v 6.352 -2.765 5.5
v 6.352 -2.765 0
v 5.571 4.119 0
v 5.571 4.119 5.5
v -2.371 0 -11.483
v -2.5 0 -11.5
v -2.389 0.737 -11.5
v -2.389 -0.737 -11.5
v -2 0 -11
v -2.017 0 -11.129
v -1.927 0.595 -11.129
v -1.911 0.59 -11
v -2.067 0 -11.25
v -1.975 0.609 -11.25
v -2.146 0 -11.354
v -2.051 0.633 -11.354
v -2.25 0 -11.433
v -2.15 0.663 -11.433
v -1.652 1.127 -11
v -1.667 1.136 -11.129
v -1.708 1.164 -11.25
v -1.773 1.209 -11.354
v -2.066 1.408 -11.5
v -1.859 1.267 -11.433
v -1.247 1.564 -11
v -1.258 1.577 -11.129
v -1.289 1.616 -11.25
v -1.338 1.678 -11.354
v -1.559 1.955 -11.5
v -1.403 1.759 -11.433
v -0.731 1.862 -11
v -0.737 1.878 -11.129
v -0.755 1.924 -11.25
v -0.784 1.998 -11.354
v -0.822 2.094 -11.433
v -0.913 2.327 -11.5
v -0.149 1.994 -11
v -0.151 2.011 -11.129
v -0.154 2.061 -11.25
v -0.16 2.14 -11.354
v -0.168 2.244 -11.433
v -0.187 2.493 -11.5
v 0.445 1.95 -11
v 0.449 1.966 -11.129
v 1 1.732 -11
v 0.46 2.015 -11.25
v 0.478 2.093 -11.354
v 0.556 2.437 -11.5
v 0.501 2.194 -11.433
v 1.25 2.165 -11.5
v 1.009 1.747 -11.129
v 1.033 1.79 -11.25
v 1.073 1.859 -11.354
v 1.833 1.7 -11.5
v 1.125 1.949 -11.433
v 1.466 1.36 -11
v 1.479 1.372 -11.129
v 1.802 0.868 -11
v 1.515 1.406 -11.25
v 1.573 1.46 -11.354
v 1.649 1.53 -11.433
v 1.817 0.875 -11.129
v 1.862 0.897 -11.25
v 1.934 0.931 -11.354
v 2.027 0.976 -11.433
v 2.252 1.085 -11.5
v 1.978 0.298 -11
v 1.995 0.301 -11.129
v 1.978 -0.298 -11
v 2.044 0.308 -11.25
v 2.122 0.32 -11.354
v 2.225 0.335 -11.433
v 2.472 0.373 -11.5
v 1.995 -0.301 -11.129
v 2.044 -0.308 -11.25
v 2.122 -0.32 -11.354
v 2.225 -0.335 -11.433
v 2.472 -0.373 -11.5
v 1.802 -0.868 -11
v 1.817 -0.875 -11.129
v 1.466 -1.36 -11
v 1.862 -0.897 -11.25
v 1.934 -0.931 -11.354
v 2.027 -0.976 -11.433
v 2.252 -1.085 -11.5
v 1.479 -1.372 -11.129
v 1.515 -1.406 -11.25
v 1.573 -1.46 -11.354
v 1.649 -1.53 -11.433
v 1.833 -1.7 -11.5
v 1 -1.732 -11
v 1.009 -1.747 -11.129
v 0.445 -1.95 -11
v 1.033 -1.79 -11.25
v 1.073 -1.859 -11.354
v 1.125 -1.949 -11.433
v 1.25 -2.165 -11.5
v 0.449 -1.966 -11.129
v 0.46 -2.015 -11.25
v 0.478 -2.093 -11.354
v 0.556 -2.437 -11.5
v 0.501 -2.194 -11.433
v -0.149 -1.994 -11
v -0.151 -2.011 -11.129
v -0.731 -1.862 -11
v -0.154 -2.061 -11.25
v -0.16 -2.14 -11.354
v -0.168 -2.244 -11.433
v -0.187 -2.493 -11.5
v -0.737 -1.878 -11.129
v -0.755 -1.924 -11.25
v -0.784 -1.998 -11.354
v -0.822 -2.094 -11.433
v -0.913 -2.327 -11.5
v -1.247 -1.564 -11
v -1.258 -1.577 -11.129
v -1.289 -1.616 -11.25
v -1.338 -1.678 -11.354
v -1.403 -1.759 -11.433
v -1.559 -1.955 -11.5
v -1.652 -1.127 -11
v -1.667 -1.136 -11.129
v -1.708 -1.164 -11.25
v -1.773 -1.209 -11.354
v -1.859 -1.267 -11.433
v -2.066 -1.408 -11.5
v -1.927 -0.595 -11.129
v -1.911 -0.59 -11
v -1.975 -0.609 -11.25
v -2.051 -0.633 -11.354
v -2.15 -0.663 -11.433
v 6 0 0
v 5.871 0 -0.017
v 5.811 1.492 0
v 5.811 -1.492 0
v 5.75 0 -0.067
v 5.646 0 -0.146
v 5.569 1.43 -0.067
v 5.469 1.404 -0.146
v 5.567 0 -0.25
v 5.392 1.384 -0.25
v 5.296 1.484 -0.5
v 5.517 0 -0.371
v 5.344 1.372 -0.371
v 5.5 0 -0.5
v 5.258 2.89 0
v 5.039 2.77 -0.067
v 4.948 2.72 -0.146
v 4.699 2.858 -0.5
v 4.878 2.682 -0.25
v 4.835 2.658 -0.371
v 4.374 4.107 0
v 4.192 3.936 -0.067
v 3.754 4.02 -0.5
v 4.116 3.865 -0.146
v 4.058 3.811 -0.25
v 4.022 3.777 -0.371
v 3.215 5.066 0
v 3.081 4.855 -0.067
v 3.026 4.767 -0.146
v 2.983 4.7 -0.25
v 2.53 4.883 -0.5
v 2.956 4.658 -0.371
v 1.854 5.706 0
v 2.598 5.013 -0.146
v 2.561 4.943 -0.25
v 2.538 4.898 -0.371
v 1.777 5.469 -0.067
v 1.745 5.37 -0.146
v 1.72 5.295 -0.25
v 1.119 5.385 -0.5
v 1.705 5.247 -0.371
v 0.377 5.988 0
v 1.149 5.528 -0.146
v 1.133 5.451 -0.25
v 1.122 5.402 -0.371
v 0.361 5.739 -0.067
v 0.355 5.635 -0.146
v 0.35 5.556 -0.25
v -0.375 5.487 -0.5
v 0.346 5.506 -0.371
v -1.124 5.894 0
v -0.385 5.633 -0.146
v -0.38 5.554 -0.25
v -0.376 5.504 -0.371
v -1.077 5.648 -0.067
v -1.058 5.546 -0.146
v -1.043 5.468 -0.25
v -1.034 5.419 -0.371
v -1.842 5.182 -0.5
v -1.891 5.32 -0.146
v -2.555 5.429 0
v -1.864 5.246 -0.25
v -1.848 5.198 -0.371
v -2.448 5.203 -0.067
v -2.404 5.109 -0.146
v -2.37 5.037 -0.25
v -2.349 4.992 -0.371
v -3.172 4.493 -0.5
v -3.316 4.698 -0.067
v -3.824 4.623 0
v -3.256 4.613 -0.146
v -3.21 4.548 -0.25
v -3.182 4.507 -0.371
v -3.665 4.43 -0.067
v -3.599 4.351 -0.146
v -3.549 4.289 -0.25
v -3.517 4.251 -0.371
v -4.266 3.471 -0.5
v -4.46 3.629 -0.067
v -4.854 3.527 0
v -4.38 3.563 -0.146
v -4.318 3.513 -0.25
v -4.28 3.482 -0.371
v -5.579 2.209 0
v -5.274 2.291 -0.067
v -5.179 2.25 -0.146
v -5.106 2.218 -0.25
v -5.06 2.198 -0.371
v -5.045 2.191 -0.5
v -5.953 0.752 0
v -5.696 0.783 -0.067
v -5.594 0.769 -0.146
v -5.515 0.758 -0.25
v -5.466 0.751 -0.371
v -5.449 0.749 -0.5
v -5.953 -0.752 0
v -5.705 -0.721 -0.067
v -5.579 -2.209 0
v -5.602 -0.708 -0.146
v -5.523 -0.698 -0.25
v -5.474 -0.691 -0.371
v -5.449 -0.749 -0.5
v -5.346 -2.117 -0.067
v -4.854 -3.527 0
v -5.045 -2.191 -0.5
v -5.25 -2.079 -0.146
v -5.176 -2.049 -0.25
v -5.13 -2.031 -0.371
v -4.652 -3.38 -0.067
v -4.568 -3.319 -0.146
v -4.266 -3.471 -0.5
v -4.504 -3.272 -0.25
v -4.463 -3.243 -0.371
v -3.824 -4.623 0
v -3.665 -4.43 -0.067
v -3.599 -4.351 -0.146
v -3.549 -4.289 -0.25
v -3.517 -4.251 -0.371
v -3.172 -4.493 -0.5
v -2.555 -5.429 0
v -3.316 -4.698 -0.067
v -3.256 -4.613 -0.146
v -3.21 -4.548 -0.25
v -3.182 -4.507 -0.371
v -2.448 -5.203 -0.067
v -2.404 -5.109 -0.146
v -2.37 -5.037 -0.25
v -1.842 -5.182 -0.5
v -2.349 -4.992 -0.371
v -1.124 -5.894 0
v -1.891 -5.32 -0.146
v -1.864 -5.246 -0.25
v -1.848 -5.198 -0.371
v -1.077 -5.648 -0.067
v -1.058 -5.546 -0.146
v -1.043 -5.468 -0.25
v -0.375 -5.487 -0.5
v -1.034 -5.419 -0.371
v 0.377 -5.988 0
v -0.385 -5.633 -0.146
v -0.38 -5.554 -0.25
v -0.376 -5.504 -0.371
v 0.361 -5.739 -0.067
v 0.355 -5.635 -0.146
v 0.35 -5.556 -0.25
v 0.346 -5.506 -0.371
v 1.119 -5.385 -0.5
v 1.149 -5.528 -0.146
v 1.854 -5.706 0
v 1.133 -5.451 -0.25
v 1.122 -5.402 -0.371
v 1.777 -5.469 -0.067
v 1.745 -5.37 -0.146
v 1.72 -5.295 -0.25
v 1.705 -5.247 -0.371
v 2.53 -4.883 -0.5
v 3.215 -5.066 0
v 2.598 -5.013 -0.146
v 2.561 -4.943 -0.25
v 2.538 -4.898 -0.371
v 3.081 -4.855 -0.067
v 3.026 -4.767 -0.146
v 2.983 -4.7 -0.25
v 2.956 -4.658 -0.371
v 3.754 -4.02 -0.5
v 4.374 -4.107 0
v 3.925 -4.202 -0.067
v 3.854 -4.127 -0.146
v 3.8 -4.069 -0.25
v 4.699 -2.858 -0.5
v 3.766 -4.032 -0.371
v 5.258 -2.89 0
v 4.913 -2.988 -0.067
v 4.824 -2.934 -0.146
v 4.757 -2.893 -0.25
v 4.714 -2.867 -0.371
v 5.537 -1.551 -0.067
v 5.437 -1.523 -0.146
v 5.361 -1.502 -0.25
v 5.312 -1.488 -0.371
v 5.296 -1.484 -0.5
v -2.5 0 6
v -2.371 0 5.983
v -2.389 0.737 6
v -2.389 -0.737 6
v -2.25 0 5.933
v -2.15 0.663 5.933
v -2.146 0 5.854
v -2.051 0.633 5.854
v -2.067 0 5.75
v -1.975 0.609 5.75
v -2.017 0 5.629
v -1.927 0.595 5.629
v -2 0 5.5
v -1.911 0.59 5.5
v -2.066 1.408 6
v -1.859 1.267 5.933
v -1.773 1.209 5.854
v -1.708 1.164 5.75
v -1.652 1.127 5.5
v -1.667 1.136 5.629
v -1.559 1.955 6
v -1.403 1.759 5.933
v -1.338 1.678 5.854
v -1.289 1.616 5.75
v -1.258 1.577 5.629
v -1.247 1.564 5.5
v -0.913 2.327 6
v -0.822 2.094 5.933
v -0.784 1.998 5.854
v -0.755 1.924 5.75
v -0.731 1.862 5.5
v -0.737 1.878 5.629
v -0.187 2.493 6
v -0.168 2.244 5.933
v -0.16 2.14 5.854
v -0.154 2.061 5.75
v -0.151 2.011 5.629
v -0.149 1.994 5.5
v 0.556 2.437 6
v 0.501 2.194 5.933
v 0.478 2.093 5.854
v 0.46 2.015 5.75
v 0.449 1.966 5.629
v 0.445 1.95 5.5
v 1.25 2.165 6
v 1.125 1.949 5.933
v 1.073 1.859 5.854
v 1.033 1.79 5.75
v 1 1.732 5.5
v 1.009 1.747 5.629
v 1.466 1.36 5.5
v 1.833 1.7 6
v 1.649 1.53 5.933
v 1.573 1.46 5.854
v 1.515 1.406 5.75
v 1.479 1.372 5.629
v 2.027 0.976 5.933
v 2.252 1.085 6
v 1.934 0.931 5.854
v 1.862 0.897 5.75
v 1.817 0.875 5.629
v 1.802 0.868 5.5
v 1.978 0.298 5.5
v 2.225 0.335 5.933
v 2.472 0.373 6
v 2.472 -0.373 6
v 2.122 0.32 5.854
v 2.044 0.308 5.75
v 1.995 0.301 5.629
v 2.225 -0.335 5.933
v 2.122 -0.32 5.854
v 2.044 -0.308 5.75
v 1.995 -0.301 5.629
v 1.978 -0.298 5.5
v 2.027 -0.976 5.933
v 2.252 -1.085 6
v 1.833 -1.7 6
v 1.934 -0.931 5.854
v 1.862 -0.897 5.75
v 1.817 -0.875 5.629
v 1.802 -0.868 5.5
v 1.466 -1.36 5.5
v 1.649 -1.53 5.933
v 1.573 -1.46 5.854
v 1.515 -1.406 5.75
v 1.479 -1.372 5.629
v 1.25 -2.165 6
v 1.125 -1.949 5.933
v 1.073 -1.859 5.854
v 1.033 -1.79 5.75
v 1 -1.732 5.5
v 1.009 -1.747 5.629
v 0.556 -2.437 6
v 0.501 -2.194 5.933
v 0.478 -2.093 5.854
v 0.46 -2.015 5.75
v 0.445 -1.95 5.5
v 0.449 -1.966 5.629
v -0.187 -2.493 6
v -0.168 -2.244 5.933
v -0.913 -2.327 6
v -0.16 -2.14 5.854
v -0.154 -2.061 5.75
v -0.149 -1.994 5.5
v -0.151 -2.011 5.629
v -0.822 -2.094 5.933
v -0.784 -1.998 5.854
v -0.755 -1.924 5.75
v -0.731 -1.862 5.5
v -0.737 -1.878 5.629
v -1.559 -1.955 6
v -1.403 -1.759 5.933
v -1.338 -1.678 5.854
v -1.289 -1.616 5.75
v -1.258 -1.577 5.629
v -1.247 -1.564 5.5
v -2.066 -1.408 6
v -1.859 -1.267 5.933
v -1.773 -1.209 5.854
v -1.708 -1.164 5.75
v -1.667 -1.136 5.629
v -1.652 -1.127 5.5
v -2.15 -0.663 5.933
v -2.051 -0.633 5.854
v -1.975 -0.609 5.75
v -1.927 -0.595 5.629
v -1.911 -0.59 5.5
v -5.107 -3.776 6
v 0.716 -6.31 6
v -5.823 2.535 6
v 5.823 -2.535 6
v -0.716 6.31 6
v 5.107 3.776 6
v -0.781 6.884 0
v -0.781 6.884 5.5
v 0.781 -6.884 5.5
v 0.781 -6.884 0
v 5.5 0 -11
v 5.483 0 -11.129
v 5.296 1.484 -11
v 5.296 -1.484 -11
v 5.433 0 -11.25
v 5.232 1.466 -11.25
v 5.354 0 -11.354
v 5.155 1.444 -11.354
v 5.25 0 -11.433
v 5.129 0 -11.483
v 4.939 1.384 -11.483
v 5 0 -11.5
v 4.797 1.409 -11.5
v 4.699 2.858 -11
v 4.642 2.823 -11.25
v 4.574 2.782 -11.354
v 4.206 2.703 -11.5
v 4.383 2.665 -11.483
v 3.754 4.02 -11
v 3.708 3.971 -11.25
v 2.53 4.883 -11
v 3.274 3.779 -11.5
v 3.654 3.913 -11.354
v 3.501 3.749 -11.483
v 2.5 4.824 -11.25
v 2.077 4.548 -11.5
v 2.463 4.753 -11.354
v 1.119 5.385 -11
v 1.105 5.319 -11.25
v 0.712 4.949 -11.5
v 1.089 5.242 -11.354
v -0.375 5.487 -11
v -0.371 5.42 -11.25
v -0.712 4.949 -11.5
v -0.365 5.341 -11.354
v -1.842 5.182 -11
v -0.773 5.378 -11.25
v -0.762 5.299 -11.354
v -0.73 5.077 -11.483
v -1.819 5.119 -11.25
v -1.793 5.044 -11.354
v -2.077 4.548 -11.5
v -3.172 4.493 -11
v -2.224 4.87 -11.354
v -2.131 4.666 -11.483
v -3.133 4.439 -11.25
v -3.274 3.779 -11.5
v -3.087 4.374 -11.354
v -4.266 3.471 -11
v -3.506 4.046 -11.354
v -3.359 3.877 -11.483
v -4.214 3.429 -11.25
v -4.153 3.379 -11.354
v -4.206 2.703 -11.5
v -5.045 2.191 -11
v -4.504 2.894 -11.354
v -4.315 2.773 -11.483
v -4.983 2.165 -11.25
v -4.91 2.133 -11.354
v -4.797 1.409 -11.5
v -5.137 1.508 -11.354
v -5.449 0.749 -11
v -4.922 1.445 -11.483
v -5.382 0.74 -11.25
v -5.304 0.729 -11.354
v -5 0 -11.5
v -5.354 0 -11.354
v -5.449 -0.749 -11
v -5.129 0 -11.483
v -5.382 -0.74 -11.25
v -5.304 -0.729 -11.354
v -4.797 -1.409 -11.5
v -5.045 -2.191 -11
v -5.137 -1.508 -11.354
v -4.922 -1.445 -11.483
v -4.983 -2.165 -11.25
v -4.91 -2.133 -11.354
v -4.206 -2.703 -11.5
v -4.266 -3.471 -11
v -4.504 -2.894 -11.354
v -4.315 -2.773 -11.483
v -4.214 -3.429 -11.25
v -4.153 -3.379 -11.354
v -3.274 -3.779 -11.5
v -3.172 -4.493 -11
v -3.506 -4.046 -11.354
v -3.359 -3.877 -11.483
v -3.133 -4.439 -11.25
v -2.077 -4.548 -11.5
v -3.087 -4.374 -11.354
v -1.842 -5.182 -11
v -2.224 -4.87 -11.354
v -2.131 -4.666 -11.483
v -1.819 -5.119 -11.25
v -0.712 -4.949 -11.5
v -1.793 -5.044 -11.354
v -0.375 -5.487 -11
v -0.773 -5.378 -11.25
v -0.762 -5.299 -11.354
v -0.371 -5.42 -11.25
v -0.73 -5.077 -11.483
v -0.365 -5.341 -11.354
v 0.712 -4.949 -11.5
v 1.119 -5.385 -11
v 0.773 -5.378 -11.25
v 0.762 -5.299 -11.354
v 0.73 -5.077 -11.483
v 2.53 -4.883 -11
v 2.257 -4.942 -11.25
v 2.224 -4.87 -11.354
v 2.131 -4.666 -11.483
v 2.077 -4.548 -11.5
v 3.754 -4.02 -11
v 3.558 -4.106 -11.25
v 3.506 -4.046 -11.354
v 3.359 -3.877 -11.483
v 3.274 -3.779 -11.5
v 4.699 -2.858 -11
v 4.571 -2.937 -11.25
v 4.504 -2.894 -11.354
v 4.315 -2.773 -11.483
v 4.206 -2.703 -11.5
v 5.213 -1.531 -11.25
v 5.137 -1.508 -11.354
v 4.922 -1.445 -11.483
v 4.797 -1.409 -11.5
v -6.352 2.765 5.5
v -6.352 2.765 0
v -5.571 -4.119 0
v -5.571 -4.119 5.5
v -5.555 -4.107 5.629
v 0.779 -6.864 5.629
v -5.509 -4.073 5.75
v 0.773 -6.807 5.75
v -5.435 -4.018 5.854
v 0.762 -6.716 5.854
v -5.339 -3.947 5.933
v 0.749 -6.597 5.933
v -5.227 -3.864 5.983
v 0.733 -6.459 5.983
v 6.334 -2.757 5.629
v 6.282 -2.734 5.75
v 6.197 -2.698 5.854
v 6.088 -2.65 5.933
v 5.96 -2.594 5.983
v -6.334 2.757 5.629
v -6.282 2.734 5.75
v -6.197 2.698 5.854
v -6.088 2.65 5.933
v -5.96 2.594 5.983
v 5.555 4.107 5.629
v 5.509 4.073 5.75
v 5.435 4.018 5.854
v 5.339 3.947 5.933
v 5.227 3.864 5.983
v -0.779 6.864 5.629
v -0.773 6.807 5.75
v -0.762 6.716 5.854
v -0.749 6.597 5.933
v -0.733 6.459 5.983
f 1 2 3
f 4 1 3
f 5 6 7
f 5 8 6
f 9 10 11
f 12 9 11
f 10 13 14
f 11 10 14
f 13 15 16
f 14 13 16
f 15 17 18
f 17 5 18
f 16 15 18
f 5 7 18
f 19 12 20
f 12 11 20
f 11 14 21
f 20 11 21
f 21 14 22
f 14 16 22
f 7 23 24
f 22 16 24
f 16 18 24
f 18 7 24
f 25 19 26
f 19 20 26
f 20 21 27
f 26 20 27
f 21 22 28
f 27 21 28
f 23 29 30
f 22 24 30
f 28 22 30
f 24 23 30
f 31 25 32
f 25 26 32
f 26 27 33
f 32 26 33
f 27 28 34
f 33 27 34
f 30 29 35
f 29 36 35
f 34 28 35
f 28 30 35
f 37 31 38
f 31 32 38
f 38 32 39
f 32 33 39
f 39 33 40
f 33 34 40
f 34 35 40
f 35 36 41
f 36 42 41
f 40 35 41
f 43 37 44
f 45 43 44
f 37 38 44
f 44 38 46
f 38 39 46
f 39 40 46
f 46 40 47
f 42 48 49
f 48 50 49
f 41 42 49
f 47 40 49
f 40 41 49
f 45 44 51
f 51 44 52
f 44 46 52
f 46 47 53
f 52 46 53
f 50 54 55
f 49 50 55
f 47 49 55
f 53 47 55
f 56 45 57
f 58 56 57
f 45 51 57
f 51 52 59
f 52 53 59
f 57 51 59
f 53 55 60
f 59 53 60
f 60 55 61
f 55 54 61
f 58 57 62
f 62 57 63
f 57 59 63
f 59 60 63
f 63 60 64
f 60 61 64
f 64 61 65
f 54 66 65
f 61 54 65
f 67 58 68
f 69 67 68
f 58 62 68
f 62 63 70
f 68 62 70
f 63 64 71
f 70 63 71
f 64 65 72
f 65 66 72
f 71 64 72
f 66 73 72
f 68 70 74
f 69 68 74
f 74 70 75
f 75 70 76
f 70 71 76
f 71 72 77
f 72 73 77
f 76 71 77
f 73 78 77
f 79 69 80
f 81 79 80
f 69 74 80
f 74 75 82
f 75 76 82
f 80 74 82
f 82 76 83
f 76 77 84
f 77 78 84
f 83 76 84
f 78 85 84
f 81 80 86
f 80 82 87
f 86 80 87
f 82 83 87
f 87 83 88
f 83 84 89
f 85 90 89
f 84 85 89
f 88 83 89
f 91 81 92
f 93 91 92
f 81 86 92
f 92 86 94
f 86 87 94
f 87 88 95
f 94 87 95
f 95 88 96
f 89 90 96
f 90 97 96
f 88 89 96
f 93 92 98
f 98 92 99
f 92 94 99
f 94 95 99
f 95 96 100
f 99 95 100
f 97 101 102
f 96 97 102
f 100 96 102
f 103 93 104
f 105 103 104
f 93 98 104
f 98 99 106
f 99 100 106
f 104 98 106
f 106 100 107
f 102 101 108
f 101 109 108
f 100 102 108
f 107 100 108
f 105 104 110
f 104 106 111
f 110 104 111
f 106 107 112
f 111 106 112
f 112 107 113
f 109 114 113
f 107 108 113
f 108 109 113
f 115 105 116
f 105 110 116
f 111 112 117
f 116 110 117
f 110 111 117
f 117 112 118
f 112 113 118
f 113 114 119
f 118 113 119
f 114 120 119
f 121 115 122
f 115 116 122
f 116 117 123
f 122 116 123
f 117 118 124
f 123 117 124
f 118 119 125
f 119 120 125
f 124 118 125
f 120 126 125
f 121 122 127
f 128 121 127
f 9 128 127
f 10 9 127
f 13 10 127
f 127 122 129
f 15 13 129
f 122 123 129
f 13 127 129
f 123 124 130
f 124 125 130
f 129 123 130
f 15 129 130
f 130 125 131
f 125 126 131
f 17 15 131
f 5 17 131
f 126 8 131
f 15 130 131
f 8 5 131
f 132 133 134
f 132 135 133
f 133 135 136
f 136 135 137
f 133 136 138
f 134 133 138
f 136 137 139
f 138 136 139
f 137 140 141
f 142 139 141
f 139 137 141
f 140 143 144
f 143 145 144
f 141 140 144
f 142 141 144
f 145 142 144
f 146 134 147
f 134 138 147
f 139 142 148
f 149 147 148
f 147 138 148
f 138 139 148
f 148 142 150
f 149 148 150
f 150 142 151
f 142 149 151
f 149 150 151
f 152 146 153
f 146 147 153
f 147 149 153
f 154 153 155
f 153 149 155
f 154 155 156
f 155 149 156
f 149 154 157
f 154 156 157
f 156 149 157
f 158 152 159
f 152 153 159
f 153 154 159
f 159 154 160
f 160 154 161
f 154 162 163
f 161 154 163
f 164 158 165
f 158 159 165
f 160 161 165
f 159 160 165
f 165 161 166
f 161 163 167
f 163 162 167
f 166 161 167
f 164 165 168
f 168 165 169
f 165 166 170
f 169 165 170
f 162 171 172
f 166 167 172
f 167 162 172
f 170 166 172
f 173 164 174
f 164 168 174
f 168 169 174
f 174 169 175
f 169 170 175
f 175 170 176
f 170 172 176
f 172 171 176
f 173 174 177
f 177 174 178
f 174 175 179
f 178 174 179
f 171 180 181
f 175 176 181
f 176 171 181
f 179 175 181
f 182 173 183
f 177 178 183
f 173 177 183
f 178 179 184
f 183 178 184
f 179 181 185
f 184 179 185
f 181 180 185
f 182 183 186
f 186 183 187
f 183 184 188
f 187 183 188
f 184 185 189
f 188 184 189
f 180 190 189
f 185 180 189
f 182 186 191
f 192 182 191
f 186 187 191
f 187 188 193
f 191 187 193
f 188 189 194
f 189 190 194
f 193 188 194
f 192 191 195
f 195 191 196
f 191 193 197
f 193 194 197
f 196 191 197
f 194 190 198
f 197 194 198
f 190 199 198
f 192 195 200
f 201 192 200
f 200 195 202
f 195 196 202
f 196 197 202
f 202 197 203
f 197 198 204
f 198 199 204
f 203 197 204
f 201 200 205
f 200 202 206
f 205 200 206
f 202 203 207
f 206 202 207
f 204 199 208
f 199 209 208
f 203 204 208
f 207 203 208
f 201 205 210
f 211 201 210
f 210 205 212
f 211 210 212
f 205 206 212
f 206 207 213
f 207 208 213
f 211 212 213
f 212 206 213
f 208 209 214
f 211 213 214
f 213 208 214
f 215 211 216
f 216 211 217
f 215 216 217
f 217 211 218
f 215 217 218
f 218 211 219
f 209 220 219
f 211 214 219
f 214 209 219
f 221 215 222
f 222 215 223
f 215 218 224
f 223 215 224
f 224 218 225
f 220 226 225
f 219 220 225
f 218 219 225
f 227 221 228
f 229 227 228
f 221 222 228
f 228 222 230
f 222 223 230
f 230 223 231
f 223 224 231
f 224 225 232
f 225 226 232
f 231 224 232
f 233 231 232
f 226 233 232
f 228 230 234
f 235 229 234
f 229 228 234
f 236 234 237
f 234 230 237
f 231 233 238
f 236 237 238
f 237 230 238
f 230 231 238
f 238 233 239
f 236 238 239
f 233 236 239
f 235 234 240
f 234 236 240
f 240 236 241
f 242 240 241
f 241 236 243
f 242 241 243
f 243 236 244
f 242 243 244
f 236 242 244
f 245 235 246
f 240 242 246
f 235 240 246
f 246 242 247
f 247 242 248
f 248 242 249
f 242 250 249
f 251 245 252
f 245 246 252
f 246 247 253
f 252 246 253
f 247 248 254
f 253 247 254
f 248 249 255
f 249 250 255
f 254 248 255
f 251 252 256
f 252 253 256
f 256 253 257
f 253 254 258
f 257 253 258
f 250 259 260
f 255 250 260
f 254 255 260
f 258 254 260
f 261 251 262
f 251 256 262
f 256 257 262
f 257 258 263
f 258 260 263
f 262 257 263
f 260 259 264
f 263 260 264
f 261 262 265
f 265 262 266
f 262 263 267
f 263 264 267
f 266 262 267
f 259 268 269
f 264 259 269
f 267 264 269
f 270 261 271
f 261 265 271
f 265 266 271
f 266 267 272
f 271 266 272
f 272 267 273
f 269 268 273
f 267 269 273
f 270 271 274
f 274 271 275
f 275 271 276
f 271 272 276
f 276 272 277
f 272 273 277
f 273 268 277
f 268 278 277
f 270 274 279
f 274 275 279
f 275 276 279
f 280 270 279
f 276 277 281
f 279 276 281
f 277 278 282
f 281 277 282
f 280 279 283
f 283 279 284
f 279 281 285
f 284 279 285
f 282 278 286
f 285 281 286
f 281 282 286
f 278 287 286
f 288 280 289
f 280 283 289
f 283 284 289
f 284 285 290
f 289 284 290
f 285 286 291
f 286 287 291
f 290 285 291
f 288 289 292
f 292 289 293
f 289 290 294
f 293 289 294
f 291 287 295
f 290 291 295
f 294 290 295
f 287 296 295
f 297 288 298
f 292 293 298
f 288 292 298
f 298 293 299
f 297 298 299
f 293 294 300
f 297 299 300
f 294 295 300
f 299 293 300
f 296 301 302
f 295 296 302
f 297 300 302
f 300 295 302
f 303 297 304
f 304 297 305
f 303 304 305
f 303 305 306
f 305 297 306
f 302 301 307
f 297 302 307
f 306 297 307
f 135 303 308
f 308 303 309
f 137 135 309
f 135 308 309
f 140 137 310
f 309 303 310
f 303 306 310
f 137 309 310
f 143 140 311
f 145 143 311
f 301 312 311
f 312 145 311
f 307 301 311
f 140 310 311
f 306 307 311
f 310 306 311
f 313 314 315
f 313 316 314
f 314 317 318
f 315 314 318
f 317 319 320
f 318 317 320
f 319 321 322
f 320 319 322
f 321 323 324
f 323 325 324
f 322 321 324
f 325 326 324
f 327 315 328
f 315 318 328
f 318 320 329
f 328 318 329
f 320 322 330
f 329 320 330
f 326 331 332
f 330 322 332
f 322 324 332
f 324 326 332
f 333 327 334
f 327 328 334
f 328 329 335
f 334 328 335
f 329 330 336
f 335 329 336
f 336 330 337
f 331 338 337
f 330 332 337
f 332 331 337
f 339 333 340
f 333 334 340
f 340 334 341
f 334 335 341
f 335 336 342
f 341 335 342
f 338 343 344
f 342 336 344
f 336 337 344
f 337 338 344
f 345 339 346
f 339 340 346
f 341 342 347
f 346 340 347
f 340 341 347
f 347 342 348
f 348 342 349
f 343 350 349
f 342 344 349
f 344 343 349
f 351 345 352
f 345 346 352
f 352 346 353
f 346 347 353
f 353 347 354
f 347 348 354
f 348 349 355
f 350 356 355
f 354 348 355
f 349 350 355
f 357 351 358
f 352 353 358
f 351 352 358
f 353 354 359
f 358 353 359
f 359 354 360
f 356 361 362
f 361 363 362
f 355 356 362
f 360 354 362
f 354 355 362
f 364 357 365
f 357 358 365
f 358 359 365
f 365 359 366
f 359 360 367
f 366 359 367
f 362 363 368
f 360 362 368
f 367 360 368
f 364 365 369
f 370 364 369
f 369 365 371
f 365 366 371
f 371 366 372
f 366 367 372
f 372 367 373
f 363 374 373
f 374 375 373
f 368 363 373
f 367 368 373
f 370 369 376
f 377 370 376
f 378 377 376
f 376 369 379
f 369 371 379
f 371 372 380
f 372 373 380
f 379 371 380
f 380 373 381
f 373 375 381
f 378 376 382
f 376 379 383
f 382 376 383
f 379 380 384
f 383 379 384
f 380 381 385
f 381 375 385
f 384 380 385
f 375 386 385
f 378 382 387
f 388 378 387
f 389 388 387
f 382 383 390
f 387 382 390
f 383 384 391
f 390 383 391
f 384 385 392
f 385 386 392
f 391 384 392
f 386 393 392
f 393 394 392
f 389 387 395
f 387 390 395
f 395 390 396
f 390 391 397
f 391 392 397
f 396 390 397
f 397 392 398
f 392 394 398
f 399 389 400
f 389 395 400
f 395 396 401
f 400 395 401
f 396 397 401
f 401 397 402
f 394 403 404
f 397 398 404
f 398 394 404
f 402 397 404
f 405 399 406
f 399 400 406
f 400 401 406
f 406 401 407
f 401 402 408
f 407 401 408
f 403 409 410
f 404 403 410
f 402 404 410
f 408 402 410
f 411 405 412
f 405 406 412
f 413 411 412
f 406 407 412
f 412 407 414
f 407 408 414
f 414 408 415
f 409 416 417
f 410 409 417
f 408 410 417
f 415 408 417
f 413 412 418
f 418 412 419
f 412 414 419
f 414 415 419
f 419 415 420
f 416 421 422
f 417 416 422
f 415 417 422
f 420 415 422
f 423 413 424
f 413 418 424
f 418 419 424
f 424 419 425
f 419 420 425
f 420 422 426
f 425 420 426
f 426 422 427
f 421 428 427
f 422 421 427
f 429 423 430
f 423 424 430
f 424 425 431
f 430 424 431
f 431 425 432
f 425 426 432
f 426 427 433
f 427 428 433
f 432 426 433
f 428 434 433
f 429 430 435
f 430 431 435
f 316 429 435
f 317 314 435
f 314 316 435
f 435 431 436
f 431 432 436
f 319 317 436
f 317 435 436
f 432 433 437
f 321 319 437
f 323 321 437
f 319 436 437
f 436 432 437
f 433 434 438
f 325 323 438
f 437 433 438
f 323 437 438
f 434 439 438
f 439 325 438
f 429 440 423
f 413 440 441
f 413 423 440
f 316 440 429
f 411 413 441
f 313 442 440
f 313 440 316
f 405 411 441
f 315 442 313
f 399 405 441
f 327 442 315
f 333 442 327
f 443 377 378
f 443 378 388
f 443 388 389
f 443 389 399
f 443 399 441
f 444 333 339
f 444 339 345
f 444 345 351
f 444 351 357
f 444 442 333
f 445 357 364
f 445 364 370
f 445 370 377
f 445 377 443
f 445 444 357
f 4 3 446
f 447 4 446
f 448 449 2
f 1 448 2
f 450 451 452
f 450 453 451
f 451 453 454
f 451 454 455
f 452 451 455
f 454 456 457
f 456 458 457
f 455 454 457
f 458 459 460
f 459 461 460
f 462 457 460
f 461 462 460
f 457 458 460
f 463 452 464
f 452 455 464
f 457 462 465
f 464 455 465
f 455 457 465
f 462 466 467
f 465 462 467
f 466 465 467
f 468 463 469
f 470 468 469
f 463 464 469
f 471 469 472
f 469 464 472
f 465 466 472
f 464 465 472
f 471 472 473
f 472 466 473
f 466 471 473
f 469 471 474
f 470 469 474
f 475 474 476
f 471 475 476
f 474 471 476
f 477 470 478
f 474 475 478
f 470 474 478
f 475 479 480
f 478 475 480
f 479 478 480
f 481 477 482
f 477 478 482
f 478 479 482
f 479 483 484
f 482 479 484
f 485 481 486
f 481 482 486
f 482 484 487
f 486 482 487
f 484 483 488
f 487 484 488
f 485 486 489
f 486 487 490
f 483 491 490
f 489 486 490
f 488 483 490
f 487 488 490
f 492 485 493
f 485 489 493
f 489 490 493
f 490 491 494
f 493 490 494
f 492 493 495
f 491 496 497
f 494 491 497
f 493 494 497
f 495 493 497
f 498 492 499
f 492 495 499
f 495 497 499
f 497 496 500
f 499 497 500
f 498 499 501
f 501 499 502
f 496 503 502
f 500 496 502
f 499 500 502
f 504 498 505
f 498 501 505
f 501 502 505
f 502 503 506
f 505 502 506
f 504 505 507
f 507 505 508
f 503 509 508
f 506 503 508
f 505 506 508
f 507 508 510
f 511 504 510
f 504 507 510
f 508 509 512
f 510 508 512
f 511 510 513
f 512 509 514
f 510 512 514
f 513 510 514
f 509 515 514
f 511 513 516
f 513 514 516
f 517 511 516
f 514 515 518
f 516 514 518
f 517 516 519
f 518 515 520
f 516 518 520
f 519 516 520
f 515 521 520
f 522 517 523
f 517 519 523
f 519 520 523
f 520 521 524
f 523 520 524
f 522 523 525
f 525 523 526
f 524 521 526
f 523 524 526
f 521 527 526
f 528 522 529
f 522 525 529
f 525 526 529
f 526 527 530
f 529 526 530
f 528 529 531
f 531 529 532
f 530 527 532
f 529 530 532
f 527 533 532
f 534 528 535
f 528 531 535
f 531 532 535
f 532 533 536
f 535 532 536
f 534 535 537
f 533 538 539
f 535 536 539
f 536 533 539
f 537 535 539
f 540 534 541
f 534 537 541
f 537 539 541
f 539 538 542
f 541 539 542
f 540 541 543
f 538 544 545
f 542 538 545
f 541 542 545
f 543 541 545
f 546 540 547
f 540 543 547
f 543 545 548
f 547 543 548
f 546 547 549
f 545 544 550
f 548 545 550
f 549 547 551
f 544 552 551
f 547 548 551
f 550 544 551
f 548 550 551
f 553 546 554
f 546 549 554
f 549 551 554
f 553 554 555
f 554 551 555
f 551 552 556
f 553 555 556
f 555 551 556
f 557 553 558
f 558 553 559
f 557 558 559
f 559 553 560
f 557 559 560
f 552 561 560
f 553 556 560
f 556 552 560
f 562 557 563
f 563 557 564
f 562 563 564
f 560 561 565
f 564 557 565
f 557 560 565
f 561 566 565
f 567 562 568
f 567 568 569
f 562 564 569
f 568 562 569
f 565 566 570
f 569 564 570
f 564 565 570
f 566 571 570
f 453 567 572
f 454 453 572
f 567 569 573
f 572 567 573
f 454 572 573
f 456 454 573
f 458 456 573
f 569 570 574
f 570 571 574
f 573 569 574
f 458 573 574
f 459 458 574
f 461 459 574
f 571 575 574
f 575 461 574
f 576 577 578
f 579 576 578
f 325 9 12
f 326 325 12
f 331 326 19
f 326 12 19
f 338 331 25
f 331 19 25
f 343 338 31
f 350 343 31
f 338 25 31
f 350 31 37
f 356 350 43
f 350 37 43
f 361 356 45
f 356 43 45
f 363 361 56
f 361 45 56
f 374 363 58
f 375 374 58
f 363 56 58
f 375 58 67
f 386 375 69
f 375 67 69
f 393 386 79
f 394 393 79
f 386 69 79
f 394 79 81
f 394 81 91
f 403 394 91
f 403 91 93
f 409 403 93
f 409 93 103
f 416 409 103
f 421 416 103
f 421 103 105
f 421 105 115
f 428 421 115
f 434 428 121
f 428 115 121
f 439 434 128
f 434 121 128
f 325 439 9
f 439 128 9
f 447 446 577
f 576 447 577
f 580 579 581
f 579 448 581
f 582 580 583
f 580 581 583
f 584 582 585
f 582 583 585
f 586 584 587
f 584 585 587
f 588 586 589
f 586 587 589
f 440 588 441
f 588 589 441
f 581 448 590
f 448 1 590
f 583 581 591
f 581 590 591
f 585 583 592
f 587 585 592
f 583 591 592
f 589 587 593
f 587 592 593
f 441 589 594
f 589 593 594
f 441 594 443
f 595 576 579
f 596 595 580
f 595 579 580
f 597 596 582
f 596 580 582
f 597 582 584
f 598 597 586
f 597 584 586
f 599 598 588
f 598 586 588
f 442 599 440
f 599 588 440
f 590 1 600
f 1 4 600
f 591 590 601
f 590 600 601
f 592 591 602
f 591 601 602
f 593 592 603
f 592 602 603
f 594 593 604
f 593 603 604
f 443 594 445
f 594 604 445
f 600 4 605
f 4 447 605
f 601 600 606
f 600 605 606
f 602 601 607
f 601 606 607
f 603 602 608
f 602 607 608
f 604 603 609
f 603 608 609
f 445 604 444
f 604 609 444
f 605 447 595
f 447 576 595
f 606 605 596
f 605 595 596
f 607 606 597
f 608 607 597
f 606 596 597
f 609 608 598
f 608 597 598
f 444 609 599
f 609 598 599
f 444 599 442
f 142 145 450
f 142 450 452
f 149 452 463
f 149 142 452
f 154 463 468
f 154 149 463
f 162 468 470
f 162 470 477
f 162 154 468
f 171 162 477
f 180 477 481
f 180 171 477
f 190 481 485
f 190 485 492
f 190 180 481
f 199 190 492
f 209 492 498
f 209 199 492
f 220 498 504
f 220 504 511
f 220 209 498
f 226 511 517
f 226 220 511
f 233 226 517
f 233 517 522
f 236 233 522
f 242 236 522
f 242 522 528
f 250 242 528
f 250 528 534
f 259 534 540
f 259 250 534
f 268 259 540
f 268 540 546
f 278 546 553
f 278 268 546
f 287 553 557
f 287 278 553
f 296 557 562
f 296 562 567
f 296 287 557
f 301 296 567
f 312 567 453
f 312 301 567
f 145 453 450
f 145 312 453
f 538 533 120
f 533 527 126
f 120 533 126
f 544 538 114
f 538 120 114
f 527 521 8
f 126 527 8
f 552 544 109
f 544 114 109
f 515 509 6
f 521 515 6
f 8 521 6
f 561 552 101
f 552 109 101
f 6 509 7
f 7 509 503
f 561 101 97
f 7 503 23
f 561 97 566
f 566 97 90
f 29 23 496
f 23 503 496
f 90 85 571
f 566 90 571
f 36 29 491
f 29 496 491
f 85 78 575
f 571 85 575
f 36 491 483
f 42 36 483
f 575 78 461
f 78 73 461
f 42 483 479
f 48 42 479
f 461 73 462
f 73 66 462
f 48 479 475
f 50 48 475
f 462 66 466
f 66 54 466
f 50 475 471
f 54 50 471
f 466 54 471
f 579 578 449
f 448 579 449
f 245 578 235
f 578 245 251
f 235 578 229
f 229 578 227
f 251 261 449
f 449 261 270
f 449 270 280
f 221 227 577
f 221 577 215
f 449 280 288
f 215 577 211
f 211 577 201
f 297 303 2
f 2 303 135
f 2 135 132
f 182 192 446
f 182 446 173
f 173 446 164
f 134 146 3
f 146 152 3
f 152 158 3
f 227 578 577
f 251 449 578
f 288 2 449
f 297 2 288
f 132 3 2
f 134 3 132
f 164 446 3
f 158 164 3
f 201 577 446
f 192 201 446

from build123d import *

# Parameters (mm, degrees)
EXTRUDE_1_DEPTH     = 6
SKETCH_2_R          = 5.5
EXTRUDE_2_DEPTH     = 11.5
SKETCH_3_R          = 2
CUT_EXTRUDE_1_DEPTH = 17.5
FILLET_1_R          = 0.5
FILLET_2_R          = 0.5
FILLET_3_R          = 0.5


with BuildPart() as part:
    # 草图1 → 凸台-拉伸1 (new body)
    with BuildSketch(Plane.XY):
        Polygon((-6.352433325, 2.765246979), (-5.570990794, -4.118745146), (0.781442531, -6.883992125), (6.352433325, -2.765246979), (5.570990794, 4.118745146), (-0.781442531, 6.883992125), align=None)
    extrude(amount=EXTRUDE_1_DEPTH)

    # 草图2 → 凸台-拉伸2 (add)
    with BuildSketch(Plane.XY):
        Circle(SKETCH_2_R)
    extrude(amount=-EXTRUDE_2_DEPTH)

    # 草图3 → 切除-拉伸1 (cut)
    with BuildSketch(Plane(origin=(0, 0, -11.5), x_dir=(-1, 0, 0), z_dir=(0, 0, -1))):
        Circle(SKETCH_3_R)
    extrude(amount=-CUT_EXTRUDE_1_DEPTH, mode=Mode.SUBTRACT)

    # 圆角1
    fillet_1_edges = [part.edges().sort_by_distance(p)[0] for p in [
        (-5.5, 0, 0),
    ]]
    fillet(fillet_1_edges, radius=FILLET_1_R - 0.0001)  # a hair under: the kernel refuses the full size

    # 圆角2
    fillet_2_edges = [part.edges().sort_by_distance(p)[0] for p in [
        (-2.394774131, -5.501368635, 6),
        (3.566937928, -4.824619552, 6),
        (5.961712059, 0.676749083, 6),
        (-5.5, 0, -11.5),
        (2.394774131, 5.501368635, 6),
        (-3.566937928, 4.824619552, 6),
        (-5.961712059, -0.676749083, 6),
    ]]
    fillet(fillet_2_edges, radius=FILLET_2_R)

    # 圆角3
    fillet_3_edges = [part.edges().sort_by_distance(p)[0] for p in [
        (2, 0, -11.5),
        (2, 0, 6),
    ]]
    fillet(fillet_3_edges, radius=FILLET_3_R)


solid = part.part
